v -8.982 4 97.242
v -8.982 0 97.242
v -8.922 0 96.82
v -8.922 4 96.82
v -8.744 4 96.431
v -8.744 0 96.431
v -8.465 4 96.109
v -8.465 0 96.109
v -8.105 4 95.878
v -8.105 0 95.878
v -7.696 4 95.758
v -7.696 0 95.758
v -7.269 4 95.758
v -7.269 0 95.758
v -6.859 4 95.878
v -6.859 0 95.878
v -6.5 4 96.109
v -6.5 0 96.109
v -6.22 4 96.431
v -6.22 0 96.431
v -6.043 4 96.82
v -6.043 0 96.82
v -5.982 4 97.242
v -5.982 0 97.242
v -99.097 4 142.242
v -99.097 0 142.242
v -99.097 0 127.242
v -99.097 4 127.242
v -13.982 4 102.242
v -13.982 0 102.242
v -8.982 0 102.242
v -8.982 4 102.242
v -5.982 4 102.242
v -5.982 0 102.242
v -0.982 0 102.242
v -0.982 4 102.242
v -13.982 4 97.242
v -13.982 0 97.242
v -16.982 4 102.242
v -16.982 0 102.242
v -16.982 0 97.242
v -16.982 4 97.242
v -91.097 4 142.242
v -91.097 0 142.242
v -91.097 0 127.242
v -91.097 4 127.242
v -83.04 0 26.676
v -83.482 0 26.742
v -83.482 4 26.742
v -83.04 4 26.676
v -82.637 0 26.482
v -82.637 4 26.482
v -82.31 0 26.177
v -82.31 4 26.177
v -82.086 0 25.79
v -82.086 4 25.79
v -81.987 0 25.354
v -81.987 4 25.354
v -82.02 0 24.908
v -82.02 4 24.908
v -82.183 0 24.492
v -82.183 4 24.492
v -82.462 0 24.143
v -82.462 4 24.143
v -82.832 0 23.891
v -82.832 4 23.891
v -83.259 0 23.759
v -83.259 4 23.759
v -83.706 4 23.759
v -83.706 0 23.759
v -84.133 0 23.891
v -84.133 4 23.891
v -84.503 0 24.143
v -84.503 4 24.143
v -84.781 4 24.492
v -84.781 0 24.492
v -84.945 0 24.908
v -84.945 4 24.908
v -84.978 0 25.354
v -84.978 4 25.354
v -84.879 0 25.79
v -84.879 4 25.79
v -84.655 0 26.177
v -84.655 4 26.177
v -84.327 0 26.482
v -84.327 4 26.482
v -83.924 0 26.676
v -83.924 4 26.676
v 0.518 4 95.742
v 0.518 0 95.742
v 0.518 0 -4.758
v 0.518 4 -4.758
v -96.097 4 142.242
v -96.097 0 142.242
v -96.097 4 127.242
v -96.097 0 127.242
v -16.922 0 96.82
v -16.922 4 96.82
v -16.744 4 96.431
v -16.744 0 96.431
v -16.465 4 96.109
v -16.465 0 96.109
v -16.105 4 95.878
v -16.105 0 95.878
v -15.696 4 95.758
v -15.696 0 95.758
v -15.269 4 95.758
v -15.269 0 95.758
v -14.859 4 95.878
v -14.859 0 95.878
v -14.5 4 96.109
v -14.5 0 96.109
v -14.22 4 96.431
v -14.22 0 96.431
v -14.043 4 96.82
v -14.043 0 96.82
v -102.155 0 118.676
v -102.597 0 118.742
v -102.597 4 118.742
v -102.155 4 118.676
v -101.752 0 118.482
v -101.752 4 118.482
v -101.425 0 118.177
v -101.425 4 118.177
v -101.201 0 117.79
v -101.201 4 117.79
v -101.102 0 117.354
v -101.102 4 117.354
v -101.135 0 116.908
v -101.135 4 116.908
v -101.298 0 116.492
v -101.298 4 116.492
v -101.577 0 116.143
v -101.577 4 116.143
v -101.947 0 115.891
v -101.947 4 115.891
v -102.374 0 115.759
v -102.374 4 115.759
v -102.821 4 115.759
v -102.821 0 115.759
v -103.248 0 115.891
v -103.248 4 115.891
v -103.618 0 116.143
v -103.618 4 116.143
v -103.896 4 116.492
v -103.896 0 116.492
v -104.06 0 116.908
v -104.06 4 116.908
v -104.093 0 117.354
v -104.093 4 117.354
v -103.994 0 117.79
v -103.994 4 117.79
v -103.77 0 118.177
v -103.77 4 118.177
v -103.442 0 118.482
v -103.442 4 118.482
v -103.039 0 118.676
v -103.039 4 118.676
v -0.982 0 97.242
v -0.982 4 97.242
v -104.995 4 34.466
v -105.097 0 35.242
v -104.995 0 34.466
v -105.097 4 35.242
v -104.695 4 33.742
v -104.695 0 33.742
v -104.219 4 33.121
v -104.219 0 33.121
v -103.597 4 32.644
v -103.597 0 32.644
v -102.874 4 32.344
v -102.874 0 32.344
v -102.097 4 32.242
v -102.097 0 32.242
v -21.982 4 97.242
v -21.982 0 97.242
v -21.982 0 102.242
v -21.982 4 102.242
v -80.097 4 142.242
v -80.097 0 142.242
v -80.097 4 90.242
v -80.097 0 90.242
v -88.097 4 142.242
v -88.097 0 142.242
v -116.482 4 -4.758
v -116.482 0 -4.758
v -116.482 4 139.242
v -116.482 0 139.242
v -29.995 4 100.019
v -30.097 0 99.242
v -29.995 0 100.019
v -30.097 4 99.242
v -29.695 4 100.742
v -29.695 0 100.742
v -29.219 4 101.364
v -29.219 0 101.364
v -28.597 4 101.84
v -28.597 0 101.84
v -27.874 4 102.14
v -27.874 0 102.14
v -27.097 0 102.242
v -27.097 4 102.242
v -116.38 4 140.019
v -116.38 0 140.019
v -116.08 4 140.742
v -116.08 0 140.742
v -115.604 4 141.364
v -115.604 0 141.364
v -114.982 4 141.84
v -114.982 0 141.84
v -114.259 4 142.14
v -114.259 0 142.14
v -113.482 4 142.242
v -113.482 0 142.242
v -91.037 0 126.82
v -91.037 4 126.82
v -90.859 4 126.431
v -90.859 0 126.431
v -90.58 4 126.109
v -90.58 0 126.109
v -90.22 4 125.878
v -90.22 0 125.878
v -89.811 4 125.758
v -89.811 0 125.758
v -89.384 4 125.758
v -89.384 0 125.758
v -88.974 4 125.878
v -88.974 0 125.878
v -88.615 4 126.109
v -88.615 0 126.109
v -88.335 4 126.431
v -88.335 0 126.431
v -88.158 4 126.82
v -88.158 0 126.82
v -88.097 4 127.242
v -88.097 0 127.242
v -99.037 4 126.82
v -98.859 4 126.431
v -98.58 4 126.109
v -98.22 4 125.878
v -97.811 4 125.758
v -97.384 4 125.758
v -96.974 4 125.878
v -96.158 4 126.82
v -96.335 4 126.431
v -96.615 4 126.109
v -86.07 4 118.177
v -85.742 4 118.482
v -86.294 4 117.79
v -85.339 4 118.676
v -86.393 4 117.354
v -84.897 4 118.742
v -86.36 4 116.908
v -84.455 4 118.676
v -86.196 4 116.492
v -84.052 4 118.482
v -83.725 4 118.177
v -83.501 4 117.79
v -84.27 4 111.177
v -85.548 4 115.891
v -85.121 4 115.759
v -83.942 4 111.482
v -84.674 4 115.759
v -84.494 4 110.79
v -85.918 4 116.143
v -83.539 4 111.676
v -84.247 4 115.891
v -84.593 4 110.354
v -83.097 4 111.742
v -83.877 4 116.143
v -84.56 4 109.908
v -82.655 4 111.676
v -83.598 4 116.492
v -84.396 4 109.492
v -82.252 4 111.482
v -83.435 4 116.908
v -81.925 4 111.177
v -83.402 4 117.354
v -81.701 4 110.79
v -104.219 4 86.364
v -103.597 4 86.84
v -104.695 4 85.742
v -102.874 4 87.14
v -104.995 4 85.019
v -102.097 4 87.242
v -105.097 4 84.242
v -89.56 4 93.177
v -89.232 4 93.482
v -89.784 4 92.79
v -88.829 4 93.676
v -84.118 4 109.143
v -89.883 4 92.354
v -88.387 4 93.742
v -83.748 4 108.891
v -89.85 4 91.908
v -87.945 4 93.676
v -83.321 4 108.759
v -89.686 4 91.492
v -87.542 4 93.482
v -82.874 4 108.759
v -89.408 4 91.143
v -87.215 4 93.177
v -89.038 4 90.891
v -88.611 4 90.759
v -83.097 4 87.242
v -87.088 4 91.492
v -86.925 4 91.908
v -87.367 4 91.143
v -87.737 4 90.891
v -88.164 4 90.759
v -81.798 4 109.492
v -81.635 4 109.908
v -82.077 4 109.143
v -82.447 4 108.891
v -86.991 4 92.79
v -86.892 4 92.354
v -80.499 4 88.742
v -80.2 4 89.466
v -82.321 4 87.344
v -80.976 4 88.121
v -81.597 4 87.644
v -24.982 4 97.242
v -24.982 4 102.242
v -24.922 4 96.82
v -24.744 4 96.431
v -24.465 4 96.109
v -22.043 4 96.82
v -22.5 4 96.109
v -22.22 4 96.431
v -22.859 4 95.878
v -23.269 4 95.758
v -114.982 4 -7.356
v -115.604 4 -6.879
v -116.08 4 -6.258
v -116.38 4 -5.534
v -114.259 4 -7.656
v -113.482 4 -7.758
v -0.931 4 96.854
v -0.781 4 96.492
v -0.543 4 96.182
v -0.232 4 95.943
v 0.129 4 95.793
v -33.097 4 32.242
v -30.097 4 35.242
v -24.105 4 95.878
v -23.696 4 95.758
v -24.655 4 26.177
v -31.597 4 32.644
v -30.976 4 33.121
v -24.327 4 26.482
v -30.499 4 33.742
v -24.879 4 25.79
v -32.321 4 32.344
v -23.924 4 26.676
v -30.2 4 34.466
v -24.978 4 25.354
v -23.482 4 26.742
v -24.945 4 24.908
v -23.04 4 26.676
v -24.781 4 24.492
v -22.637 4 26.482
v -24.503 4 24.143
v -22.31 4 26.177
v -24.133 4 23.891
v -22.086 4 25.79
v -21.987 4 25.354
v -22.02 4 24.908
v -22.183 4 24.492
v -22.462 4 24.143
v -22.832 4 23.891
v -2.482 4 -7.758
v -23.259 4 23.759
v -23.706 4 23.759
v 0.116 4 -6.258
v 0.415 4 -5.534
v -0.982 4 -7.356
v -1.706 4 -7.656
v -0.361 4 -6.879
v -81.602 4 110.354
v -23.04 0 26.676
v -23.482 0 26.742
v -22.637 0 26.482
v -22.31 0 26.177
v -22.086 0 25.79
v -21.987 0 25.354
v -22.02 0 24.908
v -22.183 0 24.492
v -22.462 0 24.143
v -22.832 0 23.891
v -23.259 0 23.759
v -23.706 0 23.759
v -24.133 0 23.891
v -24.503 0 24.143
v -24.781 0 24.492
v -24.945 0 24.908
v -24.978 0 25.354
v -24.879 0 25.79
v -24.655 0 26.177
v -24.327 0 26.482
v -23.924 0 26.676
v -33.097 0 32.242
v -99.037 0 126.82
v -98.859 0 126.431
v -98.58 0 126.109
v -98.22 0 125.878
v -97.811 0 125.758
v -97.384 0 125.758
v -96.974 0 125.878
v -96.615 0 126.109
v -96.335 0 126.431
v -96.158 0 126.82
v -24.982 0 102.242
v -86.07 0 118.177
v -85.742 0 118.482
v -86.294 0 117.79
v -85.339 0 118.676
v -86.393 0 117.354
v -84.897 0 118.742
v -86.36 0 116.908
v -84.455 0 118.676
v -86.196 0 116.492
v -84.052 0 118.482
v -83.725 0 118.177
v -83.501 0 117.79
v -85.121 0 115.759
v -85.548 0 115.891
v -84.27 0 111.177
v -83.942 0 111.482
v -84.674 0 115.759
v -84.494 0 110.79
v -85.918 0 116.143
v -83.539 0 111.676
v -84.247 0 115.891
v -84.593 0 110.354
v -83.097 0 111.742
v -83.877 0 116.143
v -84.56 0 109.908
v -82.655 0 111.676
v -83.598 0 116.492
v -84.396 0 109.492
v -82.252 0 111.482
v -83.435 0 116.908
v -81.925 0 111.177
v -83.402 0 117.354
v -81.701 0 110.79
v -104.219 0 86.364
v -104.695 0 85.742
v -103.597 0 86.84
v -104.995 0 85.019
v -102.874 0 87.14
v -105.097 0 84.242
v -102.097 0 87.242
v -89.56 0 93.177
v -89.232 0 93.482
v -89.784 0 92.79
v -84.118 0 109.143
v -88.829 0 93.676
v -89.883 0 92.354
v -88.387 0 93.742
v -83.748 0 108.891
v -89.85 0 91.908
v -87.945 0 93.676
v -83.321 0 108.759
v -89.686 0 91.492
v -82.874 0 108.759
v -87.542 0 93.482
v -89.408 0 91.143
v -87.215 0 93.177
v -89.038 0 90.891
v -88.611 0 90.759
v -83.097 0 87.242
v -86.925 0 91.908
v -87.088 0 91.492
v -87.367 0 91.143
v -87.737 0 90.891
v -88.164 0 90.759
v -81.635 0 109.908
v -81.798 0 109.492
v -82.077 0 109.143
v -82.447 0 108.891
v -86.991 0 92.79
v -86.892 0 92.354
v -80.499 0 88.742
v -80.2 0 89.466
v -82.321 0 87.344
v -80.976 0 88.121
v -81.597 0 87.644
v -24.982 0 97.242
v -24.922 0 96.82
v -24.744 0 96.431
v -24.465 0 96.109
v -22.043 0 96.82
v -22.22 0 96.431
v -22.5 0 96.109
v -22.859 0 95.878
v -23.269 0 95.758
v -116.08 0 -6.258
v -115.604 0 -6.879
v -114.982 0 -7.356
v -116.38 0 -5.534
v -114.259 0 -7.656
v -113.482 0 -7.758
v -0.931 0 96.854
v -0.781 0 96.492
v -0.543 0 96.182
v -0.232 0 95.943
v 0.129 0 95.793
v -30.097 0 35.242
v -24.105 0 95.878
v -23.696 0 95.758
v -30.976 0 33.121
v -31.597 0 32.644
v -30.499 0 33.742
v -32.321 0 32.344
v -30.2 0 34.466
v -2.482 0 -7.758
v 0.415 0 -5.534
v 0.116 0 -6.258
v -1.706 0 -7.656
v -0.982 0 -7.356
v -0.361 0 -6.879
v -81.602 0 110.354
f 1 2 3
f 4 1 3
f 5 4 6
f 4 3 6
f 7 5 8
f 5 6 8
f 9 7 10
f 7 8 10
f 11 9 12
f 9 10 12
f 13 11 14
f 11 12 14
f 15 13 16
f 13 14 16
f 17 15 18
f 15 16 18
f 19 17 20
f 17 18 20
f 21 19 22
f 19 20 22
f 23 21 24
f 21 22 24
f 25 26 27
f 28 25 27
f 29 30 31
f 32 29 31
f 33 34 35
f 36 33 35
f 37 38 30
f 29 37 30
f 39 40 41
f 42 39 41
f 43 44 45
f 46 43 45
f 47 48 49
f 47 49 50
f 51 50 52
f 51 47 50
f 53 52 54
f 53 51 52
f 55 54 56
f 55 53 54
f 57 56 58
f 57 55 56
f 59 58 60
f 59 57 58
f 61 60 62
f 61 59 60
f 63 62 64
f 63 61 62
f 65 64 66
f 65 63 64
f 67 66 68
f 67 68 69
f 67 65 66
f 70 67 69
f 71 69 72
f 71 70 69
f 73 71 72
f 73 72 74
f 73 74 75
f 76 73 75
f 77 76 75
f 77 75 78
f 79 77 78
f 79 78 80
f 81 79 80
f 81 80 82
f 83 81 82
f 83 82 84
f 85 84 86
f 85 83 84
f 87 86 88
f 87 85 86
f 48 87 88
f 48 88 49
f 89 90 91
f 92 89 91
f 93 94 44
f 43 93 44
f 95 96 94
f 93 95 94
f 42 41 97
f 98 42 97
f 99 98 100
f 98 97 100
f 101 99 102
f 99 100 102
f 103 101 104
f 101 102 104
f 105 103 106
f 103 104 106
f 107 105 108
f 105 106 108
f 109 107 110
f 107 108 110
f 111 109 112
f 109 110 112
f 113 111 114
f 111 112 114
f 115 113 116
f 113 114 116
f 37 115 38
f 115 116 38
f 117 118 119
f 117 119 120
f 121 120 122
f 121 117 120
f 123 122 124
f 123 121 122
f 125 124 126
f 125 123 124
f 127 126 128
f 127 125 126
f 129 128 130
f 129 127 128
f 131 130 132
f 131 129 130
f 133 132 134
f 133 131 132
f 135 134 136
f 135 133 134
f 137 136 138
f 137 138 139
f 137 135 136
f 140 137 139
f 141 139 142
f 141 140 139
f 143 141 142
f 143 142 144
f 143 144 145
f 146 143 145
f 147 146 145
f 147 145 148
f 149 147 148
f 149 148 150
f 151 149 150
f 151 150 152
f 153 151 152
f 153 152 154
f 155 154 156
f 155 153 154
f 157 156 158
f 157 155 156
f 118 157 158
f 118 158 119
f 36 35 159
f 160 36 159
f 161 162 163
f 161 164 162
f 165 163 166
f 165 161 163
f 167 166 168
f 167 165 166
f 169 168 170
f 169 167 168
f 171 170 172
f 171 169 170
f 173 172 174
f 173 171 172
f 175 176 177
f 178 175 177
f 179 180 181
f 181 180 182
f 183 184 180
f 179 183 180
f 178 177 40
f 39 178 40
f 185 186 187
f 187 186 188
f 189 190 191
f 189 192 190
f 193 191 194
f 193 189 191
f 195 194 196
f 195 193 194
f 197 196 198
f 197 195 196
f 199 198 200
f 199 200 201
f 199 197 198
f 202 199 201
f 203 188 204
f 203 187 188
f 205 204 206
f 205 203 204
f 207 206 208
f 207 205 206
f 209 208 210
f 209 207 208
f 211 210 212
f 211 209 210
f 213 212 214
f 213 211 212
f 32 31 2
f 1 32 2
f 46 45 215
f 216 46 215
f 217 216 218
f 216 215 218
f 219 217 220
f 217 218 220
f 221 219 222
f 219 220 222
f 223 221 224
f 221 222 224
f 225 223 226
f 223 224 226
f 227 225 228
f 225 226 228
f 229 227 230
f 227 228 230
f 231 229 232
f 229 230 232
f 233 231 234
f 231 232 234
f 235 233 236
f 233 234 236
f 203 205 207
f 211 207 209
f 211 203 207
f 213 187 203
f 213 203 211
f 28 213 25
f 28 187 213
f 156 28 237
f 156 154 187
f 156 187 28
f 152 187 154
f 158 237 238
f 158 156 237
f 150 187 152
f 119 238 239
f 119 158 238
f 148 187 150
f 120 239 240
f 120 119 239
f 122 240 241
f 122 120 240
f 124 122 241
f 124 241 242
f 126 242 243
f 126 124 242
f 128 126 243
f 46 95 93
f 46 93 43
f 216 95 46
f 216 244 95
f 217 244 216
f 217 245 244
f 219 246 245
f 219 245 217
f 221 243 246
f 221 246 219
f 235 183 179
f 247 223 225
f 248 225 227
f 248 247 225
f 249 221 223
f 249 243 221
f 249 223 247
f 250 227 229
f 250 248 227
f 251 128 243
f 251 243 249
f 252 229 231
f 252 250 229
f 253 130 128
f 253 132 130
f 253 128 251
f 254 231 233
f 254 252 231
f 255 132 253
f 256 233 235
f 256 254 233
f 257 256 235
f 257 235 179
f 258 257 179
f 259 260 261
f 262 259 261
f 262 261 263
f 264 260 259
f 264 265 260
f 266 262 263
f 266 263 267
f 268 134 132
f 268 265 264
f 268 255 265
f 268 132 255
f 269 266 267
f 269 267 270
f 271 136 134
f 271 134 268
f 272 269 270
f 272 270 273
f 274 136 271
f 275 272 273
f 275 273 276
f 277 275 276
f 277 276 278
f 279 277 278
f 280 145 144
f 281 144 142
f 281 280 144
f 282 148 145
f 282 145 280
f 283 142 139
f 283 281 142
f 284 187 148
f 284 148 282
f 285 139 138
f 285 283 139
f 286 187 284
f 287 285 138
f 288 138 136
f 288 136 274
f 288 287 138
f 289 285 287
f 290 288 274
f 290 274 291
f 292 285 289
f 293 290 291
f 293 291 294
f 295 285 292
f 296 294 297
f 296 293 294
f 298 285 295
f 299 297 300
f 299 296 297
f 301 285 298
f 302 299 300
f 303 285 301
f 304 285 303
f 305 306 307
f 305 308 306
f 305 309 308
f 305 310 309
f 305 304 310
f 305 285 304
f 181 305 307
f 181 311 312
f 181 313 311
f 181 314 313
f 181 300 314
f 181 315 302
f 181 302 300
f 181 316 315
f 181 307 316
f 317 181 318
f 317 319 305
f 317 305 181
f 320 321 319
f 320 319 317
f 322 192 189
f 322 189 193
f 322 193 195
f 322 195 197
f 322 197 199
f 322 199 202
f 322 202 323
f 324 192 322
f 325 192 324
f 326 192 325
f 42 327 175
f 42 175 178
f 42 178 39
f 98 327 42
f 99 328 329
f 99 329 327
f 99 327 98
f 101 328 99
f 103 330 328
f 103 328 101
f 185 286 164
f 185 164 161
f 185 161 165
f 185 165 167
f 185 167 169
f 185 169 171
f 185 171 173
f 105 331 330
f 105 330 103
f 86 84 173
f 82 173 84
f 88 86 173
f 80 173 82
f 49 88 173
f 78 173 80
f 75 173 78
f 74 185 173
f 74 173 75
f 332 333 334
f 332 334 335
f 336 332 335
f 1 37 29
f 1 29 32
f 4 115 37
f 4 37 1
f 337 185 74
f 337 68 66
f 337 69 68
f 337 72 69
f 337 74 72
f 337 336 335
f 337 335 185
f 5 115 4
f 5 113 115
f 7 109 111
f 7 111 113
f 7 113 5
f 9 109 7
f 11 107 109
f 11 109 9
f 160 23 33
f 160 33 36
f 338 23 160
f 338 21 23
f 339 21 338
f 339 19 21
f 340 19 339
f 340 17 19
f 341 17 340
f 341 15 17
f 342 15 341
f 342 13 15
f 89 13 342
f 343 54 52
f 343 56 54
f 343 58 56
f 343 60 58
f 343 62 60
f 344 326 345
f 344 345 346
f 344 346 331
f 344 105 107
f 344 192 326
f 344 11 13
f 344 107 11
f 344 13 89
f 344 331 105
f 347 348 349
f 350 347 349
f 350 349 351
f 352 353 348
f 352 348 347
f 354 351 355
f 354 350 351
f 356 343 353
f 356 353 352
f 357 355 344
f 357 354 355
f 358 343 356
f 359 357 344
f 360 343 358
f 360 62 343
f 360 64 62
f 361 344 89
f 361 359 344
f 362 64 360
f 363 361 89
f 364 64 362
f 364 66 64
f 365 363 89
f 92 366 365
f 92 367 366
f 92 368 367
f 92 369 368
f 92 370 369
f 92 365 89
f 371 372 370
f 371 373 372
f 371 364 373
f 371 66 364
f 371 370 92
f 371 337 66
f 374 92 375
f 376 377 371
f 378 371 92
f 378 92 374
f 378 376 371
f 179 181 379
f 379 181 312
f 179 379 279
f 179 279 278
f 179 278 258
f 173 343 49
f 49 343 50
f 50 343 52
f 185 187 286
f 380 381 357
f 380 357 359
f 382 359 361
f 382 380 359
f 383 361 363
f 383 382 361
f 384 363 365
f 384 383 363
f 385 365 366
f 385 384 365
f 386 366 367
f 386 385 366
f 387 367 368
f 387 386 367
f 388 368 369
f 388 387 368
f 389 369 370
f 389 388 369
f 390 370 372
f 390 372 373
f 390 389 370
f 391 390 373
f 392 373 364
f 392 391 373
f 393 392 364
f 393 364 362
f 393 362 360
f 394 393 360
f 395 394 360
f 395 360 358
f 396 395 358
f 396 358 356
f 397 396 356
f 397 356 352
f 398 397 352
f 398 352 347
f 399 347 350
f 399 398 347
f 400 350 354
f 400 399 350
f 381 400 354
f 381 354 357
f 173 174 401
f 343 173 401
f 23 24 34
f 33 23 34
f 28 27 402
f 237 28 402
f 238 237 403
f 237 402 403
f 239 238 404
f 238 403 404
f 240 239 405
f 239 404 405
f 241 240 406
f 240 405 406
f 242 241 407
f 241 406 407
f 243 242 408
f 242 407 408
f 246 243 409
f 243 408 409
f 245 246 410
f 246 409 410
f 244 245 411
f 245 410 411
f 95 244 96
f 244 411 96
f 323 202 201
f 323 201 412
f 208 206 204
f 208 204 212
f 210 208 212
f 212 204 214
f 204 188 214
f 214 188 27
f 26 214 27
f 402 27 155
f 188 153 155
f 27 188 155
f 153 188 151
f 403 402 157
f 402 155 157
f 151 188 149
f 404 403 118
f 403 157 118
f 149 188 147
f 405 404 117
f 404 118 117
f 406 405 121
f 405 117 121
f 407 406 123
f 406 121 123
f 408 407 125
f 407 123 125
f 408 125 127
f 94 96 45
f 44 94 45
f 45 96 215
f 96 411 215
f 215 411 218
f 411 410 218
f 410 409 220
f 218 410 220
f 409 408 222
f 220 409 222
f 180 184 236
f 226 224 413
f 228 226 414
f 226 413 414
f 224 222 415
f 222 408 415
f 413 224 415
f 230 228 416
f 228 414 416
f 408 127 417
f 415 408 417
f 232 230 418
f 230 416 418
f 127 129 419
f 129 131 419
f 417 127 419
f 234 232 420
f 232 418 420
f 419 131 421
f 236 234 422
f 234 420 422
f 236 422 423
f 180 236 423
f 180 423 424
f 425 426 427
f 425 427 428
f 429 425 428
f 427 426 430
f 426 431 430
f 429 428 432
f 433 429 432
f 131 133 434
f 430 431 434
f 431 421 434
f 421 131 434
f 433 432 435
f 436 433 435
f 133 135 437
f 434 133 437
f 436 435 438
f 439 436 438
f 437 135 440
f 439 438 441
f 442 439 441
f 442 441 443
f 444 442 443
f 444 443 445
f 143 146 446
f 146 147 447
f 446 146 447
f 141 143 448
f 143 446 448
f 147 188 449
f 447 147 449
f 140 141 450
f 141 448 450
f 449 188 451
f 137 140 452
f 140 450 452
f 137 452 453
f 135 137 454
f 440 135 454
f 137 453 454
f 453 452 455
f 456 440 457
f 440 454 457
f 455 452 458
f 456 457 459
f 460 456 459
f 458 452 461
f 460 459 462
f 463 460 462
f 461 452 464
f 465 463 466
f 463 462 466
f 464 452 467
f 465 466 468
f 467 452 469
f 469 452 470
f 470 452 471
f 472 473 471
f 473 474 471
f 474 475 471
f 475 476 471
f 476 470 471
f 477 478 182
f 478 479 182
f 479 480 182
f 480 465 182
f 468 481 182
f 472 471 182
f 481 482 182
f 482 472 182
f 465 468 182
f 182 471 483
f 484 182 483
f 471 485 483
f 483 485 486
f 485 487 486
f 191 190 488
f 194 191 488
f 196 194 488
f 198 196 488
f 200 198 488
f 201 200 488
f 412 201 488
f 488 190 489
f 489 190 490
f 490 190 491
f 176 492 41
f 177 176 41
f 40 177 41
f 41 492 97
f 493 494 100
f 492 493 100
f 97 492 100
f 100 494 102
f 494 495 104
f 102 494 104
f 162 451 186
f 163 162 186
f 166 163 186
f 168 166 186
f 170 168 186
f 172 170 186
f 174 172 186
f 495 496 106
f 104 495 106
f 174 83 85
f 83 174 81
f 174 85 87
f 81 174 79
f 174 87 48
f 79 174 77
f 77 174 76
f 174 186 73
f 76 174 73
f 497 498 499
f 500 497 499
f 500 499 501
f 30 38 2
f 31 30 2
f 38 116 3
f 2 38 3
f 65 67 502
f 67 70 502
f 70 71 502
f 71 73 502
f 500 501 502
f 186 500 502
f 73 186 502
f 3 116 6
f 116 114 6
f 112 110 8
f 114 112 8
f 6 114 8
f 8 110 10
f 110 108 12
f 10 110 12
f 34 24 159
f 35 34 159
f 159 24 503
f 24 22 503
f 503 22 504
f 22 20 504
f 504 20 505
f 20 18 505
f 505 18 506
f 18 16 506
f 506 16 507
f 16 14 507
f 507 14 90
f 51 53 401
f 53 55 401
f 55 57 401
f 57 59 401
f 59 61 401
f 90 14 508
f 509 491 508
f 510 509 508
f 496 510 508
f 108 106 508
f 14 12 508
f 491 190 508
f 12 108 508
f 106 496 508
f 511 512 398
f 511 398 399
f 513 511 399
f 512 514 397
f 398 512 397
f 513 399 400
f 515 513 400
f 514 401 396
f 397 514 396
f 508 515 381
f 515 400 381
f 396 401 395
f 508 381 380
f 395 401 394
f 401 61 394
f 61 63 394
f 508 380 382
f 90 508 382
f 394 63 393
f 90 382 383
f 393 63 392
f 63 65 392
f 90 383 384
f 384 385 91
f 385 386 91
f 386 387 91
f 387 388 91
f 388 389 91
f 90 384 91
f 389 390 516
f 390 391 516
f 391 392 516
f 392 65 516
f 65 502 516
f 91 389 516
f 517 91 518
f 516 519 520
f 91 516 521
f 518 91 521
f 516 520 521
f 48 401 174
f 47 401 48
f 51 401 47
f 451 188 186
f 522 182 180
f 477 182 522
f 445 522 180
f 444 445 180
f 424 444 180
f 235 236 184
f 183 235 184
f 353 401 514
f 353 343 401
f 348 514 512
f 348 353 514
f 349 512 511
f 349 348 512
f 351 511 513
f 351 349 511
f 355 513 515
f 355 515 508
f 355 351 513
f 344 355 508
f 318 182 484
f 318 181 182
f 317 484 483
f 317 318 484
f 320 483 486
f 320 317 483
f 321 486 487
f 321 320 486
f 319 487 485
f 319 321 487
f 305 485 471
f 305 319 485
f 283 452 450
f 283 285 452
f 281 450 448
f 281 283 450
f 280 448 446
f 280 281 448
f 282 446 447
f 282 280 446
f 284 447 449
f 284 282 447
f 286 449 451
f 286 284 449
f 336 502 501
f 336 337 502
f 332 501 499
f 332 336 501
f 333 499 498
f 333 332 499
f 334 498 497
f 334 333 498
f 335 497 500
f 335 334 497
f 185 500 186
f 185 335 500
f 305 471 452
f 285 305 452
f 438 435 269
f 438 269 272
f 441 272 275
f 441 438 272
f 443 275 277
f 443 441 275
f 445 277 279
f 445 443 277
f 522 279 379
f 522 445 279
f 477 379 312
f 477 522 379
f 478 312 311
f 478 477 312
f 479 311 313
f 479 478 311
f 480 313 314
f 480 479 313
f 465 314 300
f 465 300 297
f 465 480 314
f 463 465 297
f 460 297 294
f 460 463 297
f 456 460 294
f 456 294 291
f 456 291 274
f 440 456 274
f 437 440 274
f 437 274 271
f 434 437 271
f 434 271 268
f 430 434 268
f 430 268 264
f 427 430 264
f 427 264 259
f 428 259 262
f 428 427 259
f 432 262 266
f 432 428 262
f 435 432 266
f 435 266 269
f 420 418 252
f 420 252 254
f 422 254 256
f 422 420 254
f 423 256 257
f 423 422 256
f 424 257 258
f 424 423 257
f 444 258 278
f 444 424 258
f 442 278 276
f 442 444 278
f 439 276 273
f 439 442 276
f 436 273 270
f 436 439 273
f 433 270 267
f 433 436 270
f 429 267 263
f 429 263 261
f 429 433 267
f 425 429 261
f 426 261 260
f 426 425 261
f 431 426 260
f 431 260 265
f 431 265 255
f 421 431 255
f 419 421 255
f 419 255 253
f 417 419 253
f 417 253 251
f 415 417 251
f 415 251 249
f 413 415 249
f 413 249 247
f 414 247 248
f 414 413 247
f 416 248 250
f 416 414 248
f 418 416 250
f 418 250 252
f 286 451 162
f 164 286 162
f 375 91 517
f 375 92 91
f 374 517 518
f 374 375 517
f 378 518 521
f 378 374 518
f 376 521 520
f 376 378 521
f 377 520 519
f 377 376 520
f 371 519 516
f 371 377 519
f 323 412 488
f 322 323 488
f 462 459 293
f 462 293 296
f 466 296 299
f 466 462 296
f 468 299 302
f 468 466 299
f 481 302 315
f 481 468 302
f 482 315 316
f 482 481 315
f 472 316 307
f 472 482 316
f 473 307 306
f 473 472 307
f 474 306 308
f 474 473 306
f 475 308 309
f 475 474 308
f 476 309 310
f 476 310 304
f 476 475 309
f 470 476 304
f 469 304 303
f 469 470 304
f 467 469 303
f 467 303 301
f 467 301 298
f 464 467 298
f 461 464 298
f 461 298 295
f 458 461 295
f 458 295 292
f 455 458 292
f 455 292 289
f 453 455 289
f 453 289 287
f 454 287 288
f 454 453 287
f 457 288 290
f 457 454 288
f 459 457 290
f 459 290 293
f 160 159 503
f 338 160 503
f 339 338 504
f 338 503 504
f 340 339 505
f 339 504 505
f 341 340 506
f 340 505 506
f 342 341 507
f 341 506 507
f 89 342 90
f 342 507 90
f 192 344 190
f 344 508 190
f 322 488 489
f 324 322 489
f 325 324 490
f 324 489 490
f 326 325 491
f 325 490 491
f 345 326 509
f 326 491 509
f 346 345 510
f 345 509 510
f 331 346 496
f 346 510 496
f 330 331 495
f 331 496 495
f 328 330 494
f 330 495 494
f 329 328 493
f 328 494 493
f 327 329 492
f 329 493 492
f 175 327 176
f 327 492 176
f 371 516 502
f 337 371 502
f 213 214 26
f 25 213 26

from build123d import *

# Parameters (mm, degrees)
SKETCH_1_R      = 1.5
SKETCH_1_W      = 6
SKETCH_1_H      = 6
EXTRUDE_1_DEPTH = 4
FILLET_1_R      = 3


with BuildPart() as part:
    # 草图1 → 凸台-拉伸1 (new body)
    # profile 1 of 4: a face of its own
    with BuildSketch(Plane(origin=(0, 0, 0), x_dir=(1, 0, 0), z_dir=(0, 1, 0))):
        Polygon((-116.482347914, -142.242252719), (-105.097347914, -142.242252719), (-105.097347914, -87.242252719), (-105.097347914, -32.242252719), (-30.097347914, -32.242252719), (-30.097347914, -87.242252719), (0.517652086, -87.242252719), (0.517652086, 7.757747281), (-116.482347914, 7.757747281), align=None)
        with Locations(Location((-83.482347914, -25.242252719, 0), (0, 0, 270))):
            Circle(SKETCH_1_R, mode=Mode.SUBTRACT)
        with Locations(Location((-23.482347914, -25.242252719, 0), (0, 0, 270))):
            Circle(SKETCH_1_R, mode=Mode.SUBTRACT)
    # profile 2 of 4: a face of its own
    with BuildSketch(Plane(origin=(0, 0, 0), x_dir=(1, 0, 0), z_dir=(0, 1, 0))):
        with BuildLine():
            Line((0.517652086, -87.242252719), (-30.097347914, -87.242252719))
            Line((-30.097347914, -87.242252719), (-30.097347914, -102.242252719))
            Line((-30.097347914, -102.242252719), (-24.982347914, -102.242252719))
            Line((-24.982347914, -102.242252719), (-24.982347914, -97.242252719))
            ThreePointArc((-24.982347914, -97.242252719), (-23.482347914, -95.742252719), (-21.982347914, -97.242252719))
            Line((-21.982347914, -97.242252719), (-21.982347914, -102.242252719))
            Line((-21.982347914, -102.242252719), (-16.982347914, -102.242252719))
            Line((-16.982347914, -102.242252719), (-16.982347914, -97.242252719))
            ThreePointArc((-16.982347914, -97.242252719), (-15.482347914, -95.742252719), (-13.982347914, -97.242252719))
            Line((-13.982347914, -97.242252719), (-13.982347914, -102.242252719))
            Line((-13.982347914, -102.242252719), (-8.982347914, -102.242252719))
            Line((-8.982347914, -102.242252719), (-8.982347914, -97.242252719))
            ThreePointArc((-8.982347914, -97.242252719), (-7.482347914, -95.742252719), (-5.982347914, -97.242252719))
            Line((-5.982347914, -97.242252719), (-5.982347914, -102.242252719))
            Line((-5.982347914, -102.242252719), (-0.982347914, -102.242252719))
            Line((-0.982347914, -102.242252719), (-0.982347914, -97.242252719))
            ThreePointArc((-0.982347914, -97.242252719), (-0.543008086, -96.181592547), (0.517652086, -95.742252719))
            Line((0.517652086, -95.742252719), (0.517652086, -87.242252719))
        make_face()
    # profile 3 of 4: a face of its own
    with BuildSketch(Plane(origin=(0, 0, 0), x_dir=(1, 0, 0), z_dir=(0, 1, 0))):
        with BuildLine():
            Line((-88.097347914, -142.242252719), (-80.097347914, -142.242252719))
            Line((-80.097347914, -142.242252719), (-80.097347914, -113.742252719))
            Line((-80.097347914, -113.742252719), (-80.097347914, -113.242252719))
            Line((-80.097347914, -113.242252719), (-86.097347914, -113.242252719))
            Line((-86.097347914, -113.242252719), (-86.097347914, -107.242252719))
            Line((-86.097347914, -107.242252719), (-80.097347914, -107.242252719))
            Line((-80.097347914, -107.242252719), (-80.097347914, -87.242252719))
            Line((-80.097347914, -87.242252719), (-105.097347914, -87.242252719))
            Line((-105.097347914, -87.242252719), (-105.097347914, -142.242252719))
            Line((-105.097347914, -142.242252719), (-99.097347914, -142.242252719))
            Line((-99.097347914, -142.242252719), (-99.097347914, -127.242252719))
            ThreePointArc((-99.097347914, -127.242252719), (-97.597347914, -125.742252719), (-96.097347914, -127.242252719))
            Line((-96.097347914, -127.242252719), (-96.097347914, -142.242252719))
            Line((-96.097347914, -142.242252719), (-91.097347914, -142.242252719))
            Line((-91.097347914, -142.242252719), (-91.097347914, -127.242252719))
            ThreePointArc((-91.097347914, -127.242252719), (-89.597347914, -125.742252719), (-88.097347914, -127.242252719))
            Line((-88.097347914, -127.242252719), (-88.097347914, -142.242252719))
        make_face()
        with Locations(Location((-102.597347914, -117.242252719, 0), (0, 0, 270))):
            Circle(SKETCH_1_R, mode=Mode.SUBTRACT)
        with Locations(Location((-84.897347914, -117.242252719, 0), (0, 0, 270))):
            Circle(SKETCH_1_R, mode=Mode.SUBTRACT)
        with Locations(Location((-88.387347914, -92.242252719, 0), (0, 0, 270))):
            Circle(SKETCH_1_R, mode=Mode.SUBTRACT)
    # profile 4 of 4: a face of its own
    with BuildSketch(Plane(origin=(0, 0, 0), x_dir=(1, 0, 0), z_dir=(0, 1, 0))):
        with Locations((-83.097347914, -110.242252719)):
            Rectangle(SKETCH_1_W, SKETCH_1_H)
        with Locations(Location((-83.097347914, -110.242252719, 0), (0, 0, 270))):
            Circle(SKETCH_1_R, mode=Mode.SUBTRACT)
    extrude(amount=EXTRUDE_1_DEPTH)

    # 圆角1
    fillet_1_edges = [part.edges().sort_by_distance(p)[0] for p in [
        (-30.097347914, 2, 102.242252719),
        (-30.097347914, 2, 32.242252719),
        (-105.097347914, 2, 32.242252719),
        (-105.097347914, 2, 87.242252719),
        (-80.097347914, 2, 87.242252719),
        (-116.482347914, 2, 142.242252719),
        (-116.482347914, 2, -7.757747281),
        (0.517652086, 2, -7.757747281),
    ]]
    fillet(fillet_1_edges, radius=FILLET_1_R)


solid = part.part
